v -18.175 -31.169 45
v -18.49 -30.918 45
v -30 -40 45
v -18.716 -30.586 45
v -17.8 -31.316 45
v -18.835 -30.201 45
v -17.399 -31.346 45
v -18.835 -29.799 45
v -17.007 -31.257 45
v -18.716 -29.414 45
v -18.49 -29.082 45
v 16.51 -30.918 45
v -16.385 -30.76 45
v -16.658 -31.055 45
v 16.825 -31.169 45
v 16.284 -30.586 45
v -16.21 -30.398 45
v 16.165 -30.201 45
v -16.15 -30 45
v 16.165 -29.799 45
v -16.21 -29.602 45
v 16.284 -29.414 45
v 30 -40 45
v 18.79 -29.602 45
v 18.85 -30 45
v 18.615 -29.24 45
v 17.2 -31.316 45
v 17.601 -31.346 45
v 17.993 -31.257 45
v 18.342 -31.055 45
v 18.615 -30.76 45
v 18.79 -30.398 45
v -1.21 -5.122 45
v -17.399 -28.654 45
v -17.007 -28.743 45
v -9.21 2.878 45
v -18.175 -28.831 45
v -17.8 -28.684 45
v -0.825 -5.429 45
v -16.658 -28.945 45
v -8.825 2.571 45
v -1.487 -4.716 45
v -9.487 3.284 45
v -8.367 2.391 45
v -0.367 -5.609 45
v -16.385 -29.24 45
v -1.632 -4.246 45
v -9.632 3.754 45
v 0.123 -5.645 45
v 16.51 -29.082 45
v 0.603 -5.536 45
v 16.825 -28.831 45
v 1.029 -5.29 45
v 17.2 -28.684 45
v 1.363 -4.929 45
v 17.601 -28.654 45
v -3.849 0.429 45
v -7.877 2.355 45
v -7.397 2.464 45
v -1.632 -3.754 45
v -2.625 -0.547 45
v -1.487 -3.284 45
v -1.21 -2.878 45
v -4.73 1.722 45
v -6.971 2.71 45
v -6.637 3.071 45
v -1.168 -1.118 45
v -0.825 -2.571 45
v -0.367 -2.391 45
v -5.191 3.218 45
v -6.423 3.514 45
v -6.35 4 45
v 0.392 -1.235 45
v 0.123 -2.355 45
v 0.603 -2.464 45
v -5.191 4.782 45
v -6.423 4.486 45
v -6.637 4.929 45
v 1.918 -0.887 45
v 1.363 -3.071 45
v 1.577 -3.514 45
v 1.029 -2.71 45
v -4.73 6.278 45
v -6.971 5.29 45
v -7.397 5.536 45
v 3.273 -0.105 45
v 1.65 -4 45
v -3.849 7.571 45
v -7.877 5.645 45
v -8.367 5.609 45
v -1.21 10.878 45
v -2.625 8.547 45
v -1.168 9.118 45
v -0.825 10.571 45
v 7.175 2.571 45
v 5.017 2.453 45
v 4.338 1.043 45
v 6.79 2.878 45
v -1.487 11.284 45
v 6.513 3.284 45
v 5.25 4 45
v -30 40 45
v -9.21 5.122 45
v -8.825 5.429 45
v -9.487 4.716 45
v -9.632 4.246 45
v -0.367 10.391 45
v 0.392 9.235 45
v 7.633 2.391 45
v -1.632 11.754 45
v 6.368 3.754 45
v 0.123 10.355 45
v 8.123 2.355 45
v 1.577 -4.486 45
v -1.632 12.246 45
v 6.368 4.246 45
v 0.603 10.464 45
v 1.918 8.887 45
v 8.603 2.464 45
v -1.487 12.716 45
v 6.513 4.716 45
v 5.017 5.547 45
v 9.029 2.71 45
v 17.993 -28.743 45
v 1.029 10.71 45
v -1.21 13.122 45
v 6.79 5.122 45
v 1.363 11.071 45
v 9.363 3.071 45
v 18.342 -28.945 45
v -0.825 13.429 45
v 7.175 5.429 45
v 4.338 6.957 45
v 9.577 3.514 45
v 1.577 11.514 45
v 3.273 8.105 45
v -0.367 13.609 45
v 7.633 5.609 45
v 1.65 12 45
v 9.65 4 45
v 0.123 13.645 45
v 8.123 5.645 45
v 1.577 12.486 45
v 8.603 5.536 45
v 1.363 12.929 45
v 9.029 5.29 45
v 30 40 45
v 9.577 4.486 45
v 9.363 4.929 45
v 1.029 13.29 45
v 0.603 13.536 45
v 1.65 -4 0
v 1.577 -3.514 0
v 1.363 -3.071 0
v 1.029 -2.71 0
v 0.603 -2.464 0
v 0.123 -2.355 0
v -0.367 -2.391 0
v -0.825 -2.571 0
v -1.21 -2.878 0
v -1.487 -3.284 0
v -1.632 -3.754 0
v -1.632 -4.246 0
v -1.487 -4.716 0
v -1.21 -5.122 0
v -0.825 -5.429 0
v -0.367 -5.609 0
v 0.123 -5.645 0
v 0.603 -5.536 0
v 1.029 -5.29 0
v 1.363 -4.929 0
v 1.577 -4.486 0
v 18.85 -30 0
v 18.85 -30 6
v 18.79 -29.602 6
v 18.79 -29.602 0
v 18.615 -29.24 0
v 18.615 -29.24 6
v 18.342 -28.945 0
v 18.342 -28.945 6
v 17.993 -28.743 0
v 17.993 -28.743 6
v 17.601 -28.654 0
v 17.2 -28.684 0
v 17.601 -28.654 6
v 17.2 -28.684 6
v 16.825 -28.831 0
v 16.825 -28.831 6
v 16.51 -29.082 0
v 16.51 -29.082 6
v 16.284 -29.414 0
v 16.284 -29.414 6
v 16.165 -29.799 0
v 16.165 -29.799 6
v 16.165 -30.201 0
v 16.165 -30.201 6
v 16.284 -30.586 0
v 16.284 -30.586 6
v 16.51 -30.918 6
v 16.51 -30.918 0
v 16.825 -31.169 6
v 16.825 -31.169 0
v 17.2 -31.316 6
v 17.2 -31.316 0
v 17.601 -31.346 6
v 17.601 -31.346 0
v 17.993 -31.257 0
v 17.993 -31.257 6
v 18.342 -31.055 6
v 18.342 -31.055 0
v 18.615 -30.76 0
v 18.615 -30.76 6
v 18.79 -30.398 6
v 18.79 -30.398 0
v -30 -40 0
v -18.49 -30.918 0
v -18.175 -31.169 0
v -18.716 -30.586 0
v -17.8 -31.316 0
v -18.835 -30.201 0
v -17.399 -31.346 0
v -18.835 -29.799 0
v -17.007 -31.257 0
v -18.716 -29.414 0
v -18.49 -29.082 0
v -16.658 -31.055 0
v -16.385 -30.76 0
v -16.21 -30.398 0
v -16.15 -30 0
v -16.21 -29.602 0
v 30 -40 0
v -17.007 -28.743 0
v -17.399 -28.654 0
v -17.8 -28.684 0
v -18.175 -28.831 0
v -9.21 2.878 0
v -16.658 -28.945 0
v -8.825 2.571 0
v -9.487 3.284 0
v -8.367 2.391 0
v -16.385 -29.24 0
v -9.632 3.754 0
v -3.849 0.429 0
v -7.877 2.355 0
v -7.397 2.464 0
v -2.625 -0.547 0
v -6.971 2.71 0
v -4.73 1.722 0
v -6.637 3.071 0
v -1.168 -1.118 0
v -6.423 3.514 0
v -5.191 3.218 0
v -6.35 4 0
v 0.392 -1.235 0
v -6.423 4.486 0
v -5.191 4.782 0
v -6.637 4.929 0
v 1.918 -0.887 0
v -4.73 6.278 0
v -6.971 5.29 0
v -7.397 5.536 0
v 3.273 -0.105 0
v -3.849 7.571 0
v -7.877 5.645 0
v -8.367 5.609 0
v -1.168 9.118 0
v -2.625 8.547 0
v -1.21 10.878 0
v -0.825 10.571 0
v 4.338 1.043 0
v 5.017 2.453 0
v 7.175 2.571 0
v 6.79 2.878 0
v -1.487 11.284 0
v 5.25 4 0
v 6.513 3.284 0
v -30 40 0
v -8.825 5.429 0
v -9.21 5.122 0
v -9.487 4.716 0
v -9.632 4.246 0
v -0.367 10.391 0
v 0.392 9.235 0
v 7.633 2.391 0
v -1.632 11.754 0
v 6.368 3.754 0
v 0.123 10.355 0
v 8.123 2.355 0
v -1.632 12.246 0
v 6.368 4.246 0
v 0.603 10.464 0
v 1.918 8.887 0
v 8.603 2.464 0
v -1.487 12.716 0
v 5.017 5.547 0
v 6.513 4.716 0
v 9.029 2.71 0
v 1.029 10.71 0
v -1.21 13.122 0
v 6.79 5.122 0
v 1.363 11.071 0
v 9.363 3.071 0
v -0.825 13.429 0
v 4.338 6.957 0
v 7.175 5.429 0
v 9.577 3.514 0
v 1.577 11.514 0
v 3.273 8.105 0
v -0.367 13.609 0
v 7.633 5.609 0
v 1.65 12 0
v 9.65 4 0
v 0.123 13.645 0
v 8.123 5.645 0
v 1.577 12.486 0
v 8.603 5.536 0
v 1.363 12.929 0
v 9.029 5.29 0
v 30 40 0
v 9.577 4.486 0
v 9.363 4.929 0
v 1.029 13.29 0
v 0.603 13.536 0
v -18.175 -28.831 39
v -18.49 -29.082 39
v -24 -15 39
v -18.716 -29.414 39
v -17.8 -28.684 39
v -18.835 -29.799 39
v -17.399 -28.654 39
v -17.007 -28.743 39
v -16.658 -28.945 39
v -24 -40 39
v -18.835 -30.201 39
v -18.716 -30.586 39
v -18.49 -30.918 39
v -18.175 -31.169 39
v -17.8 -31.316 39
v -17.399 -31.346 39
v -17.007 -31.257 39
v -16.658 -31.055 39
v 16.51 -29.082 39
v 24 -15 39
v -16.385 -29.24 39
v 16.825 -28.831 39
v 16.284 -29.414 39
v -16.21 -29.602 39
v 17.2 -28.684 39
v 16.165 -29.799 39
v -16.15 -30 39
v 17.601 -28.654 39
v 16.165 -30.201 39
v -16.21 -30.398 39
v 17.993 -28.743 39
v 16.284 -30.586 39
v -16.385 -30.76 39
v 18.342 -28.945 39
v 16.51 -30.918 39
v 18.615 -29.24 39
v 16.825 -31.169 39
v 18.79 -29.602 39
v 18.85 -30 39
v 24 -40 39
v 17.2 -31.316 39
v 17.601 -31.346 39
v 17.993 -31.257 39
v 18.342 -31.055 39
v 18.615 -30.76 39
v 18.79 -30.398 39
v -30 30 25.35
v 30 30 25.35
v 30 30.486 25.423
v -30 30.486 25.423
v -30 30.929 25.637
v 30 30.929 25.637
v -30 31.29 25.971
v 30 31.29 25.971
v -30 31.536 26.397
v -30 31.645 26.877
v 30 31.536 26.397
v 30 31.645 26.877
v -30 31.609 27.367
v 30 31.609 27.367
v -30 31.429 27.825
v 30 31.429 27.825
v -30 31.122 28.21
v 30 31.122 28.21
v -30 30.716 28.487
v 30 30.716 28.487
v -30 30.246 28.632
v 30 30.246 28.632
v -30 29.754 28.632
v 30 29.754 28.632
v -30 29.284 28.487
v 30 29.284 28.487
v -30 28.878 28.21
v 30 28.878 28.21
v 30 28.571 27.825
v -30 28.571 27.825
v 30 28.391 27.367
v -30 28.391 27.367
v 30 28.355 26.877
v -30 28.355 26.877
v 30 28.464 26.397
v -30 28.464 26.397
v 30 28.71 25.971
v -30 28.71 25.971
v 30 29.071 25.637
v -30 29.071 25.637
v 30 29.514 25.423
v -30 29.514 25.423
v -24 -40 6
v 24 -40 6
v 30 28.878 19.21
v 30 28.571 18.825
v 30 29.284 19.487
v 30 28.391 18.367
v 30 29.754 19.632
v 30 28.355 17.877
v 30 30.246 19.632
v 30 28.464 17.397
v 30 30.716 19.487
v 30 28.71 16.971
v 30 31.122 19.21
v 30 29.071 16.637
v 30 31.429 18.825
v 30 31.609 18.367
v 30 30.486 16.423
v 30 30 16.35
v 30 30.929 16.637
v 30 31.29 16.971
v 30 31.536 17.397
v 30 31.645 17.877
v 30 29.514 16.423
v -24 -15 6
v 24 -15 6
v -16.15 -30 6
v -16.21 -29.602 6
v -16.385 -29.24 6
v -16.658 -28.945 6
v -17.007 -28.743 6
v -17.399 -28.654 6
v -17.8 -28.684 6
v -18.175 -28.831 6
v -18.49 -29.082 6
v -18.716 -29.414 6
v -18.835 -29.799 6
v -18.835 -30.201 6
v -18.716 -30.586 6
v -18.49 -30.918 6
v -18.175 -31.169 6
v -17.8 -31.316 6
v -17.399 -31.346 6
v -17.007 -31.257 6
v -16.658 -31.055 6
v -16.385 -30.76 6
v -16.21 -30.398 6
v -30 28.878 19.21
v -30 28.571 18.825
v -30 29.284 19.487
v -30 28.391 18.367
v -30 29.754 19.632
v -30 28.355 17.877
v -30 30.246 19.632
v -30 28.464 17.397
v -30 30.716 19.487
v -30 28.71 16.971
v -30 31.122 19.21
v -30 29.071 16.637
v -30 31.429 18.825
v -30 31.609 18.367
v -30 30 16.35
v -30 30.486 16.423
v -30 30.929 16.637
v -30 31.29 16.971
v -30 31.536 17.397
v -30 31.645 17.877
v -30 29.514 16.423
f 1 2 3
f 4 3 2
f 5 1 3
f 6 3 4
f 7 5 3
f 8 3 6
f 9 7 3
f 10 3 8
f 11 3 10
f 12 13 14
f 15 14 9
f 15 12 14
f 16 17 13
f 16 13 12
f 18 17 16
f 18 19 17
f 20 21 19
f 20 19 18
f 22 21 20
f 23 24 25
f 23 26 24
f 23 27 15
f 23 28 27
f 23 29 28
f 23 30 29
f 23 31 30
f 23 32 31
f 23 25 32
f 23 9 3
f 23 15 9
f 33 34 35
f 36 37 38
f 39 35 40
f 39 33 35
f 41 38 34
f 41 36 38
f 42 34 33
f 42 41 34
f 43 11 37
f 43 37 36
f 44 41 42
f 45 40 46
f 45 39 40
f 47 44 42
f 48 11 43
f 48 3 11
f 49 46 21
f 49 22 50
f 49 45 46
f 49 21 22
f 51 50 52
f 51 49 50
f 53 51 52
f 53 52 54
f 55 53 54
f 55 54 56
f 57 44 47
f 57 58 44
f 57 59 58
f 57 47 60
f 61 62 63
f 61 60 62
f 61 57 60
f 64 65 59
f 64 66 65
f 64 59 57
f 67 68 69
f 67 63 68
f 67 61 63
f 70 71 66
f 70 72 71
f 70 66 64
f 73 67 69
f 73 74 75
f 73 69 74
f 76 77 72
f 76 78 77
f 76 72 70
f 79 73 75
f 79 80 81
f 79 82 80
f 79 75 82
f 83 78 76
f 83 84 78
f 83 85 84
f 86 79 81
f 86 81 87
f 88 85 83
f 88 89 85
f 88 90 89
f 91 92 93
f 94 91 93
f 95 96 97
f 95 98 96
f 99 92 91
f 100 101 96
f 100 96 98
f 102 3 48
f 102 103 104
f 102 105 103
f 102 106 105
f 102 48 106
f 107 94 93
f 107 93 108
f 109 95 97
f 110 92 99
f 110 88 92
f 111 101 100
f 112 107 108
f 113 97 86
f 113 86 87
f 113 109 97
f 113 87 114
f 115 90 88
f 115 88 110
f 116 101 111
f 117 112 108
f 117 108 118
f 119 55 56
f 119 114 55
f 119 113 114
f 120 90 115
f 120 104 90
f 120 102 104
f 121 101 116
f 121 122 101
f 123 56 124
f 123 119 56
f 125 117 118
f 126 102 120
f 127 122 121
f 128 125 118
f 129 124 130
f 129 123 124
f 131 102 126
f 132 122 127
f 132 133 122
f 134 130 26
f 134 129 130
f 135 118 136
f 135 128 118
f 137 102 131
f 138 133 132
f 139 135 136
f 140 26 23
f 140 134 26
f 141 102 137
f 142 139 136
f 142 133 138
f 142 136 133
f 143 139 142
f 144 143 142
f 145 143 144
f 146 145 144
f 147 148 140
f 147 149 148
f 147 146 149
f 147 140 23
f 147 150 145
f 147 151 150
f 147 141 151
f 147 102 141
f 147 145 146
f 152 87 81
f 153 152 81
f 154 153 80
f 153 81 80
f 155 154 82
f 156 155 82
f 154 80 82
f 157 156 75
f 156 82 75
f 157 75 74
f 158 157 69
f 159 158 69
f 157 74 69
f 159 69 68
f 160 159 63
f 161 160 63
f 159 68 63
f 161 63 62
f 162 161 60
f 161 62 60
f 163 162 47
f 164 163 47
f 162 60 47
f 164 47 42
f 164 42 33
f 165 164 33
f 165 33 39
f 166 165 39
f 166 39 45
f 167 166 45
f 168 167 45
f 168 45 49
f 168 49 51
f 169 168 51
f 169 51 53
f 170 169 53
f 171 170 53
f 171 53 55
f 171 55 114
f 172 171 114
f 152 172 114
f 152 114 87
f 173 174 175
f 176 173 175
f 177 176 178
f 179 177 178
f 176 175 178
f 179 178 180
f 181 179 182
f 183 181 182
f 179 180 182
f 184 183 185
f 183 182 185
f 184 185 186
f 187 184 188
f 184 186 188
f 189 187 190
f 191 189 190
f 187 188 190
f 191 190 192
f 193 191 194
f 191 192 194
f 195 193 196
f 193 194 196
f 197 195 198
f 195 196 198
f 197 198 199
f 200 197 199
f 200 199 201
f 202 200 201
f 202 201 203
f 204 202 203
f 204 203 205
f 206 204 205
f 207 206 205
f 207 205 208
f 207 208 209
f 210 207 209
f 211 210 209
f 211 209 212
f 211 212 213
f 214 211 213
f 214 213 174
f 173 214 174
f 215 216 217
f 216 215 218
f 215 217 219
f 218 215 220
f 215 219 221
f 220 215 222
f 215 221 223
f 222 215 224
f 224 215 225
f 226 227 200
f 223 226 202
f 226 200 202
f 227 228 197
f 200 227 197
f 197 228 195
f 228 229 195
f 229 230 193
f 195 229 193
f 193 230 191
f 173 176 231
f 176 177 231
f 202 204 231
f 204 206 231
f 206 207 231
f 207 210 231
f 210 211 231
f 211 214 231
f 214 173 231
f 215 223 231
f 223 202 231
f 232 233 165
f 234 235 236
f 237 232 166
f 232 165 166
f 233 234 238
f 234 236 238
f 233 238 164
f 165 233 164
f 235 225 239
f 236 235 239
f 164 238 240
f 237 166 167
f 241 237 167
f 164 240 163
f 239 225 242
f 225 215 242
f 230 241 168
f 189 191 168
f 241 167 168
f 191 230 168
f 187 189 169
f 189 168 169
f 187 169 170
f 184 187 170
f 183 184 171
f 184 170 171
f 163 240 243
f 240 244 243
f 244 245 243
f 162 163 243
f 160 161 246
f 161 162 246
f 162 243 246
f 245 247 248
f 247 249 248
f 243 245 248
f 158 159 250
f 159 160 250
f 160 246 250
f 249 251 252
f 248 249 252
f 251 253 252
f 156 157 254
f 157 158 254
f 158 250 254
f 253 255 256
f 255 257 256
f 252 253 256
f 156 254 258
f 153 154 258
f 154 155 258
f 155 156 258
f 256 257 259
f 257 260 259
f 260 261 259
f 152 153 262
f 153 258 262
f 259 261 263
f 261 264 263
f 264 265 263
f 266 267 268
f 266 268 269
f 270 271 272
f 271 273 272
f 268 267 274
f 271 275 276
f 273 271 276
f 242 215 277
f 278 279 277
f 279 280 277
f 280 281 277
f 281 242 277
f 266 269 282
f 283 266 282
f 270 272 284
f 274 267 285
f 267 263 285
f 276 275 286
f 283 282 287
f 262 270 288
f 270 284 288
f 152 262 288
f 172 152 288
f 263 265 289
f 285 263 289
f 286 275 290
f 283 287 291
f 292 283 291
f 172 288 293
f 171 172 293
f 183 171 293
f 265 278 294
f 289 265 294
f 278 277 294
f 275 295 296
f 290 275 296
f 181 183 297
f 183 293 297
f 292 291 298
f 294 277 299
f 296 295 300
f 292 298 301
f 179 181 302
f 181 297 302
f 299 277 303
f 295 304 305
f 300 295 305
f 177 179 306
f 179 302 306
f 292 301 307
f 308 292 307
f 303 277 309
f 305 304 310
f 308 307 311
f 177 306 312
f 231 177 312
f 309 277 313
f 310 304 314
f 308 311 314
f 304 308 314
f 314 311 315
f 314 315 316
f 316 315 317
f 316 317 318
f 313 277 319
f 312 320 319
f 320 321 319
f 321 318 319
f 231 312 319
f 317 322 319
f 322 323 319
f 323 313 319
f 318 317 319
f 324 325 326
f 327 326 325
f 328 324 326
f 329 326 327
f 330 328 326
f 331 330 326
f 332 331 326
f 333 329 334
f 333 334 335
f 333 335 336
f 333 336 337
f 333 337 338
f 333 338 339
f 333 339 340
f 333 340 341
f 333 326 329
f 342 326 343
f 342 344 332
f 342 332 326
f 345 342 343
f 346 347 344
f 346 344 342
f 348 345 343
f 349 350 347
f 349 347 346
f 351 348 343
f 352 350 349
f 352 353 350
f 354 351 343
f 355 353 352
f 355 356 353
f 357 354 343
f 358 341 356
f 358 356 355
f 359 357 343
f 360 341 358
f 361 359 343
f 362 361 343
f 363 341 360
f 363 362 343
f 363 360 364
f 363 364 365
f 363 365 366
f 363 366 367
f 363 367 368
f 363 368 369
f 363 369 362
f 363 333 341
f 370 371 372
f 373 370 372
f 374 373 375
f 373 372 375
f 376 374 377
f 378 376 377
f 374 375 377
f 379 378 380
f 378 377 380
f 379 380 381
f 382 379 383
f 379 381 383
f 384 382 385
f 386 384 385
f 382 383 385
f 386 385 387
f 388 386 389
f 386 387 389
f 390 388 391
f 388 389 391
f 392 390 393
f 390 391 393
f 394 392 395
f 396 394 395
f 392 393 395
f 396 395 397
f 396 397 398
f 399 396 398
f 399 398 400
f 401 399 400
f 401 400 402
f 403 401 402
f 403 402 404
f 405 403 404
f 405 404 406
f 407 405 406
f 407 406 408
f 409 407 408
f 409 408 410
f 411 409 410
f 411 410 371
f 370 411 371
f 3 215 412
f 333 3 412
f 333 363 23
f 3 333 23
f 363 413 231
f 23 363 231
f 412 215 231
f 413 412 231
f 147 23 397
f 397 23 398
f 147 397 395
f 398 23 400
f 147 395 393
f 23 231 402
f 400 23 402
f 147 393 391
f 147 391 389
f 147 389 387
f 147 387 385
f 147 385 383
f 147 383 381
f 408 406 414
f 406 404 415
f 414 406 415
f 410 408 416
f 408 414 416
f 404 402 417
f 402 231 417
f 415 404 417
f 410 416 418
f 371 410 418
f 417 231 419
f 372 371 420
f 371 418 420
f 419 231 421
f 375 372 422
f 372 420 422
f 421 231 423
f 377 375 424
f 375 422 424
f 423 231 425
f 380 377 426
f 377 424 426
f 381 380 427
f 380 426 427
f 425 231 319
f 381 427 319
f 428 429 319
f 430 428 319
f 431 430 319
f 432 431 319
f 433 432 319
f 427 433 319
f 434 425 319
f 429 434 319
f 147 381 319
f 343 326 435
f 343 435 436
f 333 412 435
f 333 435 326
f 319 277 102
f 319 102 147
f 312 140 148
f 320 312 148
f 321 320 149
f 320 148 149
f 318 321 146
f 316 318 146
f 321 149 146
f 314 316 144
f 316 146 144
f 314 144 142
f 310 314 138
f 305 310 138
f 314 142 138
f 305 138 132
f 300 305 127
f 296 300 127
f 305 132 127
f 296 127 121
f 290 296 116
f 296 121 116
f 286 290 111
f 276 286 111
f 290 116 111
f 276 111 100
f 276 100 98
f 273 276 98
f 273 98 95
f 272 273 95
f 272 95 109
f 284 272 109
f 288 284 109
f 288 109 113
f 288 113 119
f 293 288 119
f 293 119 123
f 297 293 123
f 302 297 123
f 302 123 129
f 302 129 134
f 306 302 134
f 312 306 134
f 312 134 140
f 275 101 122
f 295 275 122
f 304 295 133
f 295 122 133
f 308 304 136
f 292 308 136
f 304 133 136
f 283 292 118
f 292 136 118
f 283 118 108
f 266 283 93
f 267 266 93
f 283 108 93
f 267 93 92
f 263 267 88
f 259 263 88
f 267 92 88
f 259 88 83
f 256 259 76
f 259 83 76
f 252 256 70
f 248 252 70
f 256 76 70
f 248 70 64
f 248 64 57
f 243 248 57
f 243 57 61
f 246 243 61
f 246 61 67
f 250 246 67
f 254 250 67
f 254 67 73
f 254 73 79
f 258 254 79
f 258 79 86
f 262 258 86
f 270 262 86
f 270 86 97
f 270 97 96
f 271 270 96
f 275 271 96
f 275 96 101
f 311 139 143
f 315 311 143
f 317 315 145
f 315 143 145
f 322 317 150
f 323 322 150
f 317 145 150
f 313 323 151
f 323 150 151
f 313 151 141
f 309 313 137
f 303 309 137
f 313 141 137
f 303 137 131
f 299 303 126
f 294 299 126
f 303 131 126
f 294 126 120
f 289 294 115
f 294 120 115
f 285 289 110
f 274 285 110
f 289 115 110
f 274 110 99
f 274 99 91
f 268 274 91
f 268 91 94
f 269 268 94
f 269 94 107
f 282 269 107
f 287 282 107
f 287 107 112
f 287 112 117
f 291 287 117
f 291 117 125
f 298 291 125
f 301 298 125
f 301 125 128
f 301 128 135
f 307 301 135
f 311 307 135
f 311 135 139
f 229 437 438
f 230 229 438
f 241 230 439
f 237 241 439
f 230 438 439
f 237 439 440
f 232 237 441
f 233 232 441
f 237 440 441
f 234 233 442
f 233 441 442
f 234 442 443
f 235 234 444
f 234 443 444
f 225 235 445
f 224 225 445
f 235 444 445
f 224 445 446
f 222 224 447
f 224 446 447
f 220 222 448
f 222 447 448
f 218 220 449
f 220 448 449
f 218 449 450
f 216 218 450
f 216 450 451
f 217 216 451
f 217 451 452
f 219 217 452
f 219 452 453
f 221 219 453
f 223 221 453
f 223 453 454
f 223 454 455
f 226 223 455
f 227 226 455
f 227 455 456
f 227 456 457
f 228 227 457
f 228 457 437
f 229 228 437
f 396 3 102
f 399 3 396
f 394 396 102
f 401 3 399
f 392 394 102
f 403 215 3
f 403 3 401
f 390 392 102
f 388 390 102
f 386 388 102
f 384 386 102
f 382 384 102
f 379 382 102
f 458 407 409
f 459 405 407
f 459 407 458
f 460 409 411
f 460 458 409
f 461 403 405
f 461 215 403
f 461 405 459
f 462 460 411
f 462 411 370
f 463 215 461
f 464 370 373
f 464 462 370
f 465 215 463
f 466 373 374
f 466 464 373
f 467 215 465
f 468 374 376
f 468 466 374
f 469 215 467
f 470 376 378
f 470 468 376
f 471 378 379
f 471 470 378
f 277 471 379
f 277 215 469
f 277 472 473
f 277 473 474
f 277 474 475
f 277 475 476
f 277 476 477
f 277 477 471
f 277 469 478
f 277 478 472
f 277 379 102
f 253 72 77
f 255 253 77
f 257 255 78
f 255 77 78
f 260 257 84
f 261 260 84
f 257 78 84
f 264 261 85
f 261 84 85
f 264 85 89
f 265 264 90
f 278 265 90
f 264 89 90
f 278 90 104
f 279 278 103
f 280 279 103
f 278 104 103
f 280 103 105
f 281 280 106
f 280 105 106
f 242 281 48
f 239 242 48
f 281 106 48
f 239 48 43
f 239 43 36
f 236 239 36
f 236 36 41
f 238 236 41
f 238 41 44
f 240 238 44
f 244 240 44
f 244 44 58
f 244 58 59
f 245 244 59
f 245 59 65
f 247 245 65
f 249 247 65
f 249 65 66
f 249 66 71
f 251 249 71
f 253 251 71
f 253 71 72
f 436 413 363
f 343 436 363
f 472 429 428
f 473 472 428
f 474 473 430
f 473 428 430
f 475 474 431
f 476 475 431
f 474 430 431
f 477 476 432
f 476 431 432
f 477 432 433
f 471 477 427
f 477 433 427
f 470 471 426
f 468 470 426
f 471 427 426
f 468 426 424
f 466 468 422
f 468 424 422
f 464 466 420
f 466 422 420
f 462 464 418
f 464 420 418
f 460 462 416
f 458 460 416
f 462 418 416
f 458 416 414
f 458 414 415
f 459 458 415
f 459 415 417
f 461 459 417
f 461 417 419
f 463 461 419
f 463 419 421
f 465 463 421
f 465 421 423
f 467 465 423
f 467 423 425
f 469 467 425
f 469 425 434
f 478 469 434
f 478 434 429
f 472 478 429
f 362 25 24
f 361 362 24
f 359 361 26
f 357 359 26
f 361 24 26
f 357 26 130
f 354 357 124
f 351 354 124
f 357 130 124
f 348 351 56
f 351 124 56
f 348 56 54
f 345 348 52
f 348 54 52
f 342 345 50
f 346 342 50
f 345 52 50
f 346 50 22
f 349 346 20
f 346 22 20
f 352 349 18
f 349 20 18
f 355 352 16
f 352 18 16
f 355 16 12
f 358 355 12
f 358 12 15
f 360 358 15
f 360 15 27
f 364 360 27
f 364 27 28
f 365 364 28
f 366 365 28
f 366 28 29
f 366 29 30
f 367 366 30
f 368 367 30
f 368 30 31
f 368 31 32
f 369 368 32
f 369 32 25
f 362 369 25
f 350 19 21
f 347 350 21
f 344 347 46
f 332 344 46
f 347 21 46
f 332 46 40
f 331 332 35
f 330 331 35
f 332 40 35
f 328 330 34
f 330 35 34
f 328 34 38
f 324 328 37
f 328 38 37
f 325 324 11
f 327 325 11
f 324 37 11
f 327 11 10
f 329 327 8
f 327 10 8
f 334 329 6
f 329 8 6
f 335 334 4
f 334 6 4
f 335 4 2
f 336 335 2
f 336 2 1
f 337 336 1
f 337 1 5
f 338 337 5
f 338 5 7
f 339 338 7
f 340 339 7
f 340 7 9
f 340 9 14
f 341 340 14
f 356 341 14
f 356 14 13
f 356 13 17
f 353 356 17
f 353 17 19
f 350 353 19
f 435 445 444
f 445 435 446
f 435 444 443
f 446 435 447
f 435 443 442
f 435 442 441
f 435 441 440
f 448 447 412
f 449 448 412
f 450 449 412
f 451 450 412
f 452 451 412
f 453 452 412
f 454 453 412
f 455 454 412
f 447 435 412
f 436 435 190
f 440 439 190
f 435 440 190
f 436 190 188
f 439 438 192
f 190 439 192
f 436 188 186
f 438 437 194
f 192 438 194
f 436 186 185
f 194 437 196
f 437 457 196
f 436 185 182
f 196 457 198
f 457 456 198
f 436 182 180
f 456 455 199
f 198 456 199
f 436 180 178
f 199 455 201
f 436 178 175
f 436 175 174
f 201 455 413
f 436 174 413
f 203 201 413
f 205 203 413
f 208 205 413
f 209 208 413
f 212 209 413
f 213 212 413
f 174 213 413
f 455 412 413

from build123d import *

# Parameters (mm, degrees)
SKETCH_1_W          = 60
SKETCH_1_H          = 80
EXTRUDE_1_DEPTH     = 45
SKETCH_2_R          = 1.35
CUT_EXTRUDE_1_DEPTH = 100
SKETCH_3_R          = 1.65
CUT_EXTRUDE_2_DEPTH = 100
SKETCH_4_R          = 5.25
CUT_EXTRUDE_3_DEPTH = 1000
SKETCH_5_W          = 48
SKETCH_5_H          = 33
CUT_EXTRUDE_4_DEPTH = 25
SKETCH_6_R          = 1.65
CUT_EXTRUDE_5_DEPTH = 5000


with BuildPart() as part:
    # 草图1 → 凸台-拉伸1 (new body)
    with BuildSketch(Plane.XY):
        Rectangle(SKETCH_1_W, SKETCH_1_H)
    extrude(amount=EXTRUDE_1_DEPTH)

    # 草图2 → 切除-拉伸1 (cut)
    with BuildSketch(Plane.XY.offset(45)):
        with Locations((17.5, -30)):
            Circle(SKETCH_2_R)
        with Locations((-17.5, -30)):
            Circle(SKETCH_2_R)
    extrude(amount=-CUT_EXTRUDE_1_DEPTH, mode=Mode.SUBTRACT)

    # 草图3 → 切除-拉伸2 (cut)
    with BuildSketch(Plane.XY.offset(45)):
        with Locations((8, 4)):
            Circle(SKETCH_3_R)
        with Locations((0, 12)):
            Circle(SKETCH_3_R)
        with Locations((-8, 4)):
            Circle(SKETCH_3_R)
        with Locations((0, -4)):
            Circle(SKETCH_3_R)
    extrude(amount=-CUT_EXTRUDE_2_DEPTH, mode=Mode.SUBTRACT)

    # 草图4 → 切除-拉伸3 (cut)
    with BuildSketch(Plane.XY.offset(45)):
        with Locations((0, 4)):
            Circle(SKETCH_4_R)
    extrude(amount=-CUT_EXTRUDE_3_DEPTH, mode=Mode.SUBTRACT)

    # 草图5 → 切除-拉伸4 (cut)
    with BuildSketch(Plane.XZ.offset(40)):
        with Locations((0, 22.5)):
            Rectangle(SKETCH_5_W, SKETCH_5_H)
    extrude(amount=-CUT_EXTRUDE_4_DEPTH, mode=Mode.SUBTRACT)

    # 草图6 → 切除-拉伸5 (cut)
    with BuildSketch(Plane(origin=(30, 0, 0), x_dir=(0, 0, -1), z_dir=(1, 0, 0))):
        with Locations((-18, 30)):
            Circle(SKETCH_6_R)
        with Locations((-27, 30)):
            Circle(SKETCH_6_R)
    extrude(amount=-CUT_EXTRUDE_5_DEPTH, mode=Mode.SUBTRACT)


solid = part.part
